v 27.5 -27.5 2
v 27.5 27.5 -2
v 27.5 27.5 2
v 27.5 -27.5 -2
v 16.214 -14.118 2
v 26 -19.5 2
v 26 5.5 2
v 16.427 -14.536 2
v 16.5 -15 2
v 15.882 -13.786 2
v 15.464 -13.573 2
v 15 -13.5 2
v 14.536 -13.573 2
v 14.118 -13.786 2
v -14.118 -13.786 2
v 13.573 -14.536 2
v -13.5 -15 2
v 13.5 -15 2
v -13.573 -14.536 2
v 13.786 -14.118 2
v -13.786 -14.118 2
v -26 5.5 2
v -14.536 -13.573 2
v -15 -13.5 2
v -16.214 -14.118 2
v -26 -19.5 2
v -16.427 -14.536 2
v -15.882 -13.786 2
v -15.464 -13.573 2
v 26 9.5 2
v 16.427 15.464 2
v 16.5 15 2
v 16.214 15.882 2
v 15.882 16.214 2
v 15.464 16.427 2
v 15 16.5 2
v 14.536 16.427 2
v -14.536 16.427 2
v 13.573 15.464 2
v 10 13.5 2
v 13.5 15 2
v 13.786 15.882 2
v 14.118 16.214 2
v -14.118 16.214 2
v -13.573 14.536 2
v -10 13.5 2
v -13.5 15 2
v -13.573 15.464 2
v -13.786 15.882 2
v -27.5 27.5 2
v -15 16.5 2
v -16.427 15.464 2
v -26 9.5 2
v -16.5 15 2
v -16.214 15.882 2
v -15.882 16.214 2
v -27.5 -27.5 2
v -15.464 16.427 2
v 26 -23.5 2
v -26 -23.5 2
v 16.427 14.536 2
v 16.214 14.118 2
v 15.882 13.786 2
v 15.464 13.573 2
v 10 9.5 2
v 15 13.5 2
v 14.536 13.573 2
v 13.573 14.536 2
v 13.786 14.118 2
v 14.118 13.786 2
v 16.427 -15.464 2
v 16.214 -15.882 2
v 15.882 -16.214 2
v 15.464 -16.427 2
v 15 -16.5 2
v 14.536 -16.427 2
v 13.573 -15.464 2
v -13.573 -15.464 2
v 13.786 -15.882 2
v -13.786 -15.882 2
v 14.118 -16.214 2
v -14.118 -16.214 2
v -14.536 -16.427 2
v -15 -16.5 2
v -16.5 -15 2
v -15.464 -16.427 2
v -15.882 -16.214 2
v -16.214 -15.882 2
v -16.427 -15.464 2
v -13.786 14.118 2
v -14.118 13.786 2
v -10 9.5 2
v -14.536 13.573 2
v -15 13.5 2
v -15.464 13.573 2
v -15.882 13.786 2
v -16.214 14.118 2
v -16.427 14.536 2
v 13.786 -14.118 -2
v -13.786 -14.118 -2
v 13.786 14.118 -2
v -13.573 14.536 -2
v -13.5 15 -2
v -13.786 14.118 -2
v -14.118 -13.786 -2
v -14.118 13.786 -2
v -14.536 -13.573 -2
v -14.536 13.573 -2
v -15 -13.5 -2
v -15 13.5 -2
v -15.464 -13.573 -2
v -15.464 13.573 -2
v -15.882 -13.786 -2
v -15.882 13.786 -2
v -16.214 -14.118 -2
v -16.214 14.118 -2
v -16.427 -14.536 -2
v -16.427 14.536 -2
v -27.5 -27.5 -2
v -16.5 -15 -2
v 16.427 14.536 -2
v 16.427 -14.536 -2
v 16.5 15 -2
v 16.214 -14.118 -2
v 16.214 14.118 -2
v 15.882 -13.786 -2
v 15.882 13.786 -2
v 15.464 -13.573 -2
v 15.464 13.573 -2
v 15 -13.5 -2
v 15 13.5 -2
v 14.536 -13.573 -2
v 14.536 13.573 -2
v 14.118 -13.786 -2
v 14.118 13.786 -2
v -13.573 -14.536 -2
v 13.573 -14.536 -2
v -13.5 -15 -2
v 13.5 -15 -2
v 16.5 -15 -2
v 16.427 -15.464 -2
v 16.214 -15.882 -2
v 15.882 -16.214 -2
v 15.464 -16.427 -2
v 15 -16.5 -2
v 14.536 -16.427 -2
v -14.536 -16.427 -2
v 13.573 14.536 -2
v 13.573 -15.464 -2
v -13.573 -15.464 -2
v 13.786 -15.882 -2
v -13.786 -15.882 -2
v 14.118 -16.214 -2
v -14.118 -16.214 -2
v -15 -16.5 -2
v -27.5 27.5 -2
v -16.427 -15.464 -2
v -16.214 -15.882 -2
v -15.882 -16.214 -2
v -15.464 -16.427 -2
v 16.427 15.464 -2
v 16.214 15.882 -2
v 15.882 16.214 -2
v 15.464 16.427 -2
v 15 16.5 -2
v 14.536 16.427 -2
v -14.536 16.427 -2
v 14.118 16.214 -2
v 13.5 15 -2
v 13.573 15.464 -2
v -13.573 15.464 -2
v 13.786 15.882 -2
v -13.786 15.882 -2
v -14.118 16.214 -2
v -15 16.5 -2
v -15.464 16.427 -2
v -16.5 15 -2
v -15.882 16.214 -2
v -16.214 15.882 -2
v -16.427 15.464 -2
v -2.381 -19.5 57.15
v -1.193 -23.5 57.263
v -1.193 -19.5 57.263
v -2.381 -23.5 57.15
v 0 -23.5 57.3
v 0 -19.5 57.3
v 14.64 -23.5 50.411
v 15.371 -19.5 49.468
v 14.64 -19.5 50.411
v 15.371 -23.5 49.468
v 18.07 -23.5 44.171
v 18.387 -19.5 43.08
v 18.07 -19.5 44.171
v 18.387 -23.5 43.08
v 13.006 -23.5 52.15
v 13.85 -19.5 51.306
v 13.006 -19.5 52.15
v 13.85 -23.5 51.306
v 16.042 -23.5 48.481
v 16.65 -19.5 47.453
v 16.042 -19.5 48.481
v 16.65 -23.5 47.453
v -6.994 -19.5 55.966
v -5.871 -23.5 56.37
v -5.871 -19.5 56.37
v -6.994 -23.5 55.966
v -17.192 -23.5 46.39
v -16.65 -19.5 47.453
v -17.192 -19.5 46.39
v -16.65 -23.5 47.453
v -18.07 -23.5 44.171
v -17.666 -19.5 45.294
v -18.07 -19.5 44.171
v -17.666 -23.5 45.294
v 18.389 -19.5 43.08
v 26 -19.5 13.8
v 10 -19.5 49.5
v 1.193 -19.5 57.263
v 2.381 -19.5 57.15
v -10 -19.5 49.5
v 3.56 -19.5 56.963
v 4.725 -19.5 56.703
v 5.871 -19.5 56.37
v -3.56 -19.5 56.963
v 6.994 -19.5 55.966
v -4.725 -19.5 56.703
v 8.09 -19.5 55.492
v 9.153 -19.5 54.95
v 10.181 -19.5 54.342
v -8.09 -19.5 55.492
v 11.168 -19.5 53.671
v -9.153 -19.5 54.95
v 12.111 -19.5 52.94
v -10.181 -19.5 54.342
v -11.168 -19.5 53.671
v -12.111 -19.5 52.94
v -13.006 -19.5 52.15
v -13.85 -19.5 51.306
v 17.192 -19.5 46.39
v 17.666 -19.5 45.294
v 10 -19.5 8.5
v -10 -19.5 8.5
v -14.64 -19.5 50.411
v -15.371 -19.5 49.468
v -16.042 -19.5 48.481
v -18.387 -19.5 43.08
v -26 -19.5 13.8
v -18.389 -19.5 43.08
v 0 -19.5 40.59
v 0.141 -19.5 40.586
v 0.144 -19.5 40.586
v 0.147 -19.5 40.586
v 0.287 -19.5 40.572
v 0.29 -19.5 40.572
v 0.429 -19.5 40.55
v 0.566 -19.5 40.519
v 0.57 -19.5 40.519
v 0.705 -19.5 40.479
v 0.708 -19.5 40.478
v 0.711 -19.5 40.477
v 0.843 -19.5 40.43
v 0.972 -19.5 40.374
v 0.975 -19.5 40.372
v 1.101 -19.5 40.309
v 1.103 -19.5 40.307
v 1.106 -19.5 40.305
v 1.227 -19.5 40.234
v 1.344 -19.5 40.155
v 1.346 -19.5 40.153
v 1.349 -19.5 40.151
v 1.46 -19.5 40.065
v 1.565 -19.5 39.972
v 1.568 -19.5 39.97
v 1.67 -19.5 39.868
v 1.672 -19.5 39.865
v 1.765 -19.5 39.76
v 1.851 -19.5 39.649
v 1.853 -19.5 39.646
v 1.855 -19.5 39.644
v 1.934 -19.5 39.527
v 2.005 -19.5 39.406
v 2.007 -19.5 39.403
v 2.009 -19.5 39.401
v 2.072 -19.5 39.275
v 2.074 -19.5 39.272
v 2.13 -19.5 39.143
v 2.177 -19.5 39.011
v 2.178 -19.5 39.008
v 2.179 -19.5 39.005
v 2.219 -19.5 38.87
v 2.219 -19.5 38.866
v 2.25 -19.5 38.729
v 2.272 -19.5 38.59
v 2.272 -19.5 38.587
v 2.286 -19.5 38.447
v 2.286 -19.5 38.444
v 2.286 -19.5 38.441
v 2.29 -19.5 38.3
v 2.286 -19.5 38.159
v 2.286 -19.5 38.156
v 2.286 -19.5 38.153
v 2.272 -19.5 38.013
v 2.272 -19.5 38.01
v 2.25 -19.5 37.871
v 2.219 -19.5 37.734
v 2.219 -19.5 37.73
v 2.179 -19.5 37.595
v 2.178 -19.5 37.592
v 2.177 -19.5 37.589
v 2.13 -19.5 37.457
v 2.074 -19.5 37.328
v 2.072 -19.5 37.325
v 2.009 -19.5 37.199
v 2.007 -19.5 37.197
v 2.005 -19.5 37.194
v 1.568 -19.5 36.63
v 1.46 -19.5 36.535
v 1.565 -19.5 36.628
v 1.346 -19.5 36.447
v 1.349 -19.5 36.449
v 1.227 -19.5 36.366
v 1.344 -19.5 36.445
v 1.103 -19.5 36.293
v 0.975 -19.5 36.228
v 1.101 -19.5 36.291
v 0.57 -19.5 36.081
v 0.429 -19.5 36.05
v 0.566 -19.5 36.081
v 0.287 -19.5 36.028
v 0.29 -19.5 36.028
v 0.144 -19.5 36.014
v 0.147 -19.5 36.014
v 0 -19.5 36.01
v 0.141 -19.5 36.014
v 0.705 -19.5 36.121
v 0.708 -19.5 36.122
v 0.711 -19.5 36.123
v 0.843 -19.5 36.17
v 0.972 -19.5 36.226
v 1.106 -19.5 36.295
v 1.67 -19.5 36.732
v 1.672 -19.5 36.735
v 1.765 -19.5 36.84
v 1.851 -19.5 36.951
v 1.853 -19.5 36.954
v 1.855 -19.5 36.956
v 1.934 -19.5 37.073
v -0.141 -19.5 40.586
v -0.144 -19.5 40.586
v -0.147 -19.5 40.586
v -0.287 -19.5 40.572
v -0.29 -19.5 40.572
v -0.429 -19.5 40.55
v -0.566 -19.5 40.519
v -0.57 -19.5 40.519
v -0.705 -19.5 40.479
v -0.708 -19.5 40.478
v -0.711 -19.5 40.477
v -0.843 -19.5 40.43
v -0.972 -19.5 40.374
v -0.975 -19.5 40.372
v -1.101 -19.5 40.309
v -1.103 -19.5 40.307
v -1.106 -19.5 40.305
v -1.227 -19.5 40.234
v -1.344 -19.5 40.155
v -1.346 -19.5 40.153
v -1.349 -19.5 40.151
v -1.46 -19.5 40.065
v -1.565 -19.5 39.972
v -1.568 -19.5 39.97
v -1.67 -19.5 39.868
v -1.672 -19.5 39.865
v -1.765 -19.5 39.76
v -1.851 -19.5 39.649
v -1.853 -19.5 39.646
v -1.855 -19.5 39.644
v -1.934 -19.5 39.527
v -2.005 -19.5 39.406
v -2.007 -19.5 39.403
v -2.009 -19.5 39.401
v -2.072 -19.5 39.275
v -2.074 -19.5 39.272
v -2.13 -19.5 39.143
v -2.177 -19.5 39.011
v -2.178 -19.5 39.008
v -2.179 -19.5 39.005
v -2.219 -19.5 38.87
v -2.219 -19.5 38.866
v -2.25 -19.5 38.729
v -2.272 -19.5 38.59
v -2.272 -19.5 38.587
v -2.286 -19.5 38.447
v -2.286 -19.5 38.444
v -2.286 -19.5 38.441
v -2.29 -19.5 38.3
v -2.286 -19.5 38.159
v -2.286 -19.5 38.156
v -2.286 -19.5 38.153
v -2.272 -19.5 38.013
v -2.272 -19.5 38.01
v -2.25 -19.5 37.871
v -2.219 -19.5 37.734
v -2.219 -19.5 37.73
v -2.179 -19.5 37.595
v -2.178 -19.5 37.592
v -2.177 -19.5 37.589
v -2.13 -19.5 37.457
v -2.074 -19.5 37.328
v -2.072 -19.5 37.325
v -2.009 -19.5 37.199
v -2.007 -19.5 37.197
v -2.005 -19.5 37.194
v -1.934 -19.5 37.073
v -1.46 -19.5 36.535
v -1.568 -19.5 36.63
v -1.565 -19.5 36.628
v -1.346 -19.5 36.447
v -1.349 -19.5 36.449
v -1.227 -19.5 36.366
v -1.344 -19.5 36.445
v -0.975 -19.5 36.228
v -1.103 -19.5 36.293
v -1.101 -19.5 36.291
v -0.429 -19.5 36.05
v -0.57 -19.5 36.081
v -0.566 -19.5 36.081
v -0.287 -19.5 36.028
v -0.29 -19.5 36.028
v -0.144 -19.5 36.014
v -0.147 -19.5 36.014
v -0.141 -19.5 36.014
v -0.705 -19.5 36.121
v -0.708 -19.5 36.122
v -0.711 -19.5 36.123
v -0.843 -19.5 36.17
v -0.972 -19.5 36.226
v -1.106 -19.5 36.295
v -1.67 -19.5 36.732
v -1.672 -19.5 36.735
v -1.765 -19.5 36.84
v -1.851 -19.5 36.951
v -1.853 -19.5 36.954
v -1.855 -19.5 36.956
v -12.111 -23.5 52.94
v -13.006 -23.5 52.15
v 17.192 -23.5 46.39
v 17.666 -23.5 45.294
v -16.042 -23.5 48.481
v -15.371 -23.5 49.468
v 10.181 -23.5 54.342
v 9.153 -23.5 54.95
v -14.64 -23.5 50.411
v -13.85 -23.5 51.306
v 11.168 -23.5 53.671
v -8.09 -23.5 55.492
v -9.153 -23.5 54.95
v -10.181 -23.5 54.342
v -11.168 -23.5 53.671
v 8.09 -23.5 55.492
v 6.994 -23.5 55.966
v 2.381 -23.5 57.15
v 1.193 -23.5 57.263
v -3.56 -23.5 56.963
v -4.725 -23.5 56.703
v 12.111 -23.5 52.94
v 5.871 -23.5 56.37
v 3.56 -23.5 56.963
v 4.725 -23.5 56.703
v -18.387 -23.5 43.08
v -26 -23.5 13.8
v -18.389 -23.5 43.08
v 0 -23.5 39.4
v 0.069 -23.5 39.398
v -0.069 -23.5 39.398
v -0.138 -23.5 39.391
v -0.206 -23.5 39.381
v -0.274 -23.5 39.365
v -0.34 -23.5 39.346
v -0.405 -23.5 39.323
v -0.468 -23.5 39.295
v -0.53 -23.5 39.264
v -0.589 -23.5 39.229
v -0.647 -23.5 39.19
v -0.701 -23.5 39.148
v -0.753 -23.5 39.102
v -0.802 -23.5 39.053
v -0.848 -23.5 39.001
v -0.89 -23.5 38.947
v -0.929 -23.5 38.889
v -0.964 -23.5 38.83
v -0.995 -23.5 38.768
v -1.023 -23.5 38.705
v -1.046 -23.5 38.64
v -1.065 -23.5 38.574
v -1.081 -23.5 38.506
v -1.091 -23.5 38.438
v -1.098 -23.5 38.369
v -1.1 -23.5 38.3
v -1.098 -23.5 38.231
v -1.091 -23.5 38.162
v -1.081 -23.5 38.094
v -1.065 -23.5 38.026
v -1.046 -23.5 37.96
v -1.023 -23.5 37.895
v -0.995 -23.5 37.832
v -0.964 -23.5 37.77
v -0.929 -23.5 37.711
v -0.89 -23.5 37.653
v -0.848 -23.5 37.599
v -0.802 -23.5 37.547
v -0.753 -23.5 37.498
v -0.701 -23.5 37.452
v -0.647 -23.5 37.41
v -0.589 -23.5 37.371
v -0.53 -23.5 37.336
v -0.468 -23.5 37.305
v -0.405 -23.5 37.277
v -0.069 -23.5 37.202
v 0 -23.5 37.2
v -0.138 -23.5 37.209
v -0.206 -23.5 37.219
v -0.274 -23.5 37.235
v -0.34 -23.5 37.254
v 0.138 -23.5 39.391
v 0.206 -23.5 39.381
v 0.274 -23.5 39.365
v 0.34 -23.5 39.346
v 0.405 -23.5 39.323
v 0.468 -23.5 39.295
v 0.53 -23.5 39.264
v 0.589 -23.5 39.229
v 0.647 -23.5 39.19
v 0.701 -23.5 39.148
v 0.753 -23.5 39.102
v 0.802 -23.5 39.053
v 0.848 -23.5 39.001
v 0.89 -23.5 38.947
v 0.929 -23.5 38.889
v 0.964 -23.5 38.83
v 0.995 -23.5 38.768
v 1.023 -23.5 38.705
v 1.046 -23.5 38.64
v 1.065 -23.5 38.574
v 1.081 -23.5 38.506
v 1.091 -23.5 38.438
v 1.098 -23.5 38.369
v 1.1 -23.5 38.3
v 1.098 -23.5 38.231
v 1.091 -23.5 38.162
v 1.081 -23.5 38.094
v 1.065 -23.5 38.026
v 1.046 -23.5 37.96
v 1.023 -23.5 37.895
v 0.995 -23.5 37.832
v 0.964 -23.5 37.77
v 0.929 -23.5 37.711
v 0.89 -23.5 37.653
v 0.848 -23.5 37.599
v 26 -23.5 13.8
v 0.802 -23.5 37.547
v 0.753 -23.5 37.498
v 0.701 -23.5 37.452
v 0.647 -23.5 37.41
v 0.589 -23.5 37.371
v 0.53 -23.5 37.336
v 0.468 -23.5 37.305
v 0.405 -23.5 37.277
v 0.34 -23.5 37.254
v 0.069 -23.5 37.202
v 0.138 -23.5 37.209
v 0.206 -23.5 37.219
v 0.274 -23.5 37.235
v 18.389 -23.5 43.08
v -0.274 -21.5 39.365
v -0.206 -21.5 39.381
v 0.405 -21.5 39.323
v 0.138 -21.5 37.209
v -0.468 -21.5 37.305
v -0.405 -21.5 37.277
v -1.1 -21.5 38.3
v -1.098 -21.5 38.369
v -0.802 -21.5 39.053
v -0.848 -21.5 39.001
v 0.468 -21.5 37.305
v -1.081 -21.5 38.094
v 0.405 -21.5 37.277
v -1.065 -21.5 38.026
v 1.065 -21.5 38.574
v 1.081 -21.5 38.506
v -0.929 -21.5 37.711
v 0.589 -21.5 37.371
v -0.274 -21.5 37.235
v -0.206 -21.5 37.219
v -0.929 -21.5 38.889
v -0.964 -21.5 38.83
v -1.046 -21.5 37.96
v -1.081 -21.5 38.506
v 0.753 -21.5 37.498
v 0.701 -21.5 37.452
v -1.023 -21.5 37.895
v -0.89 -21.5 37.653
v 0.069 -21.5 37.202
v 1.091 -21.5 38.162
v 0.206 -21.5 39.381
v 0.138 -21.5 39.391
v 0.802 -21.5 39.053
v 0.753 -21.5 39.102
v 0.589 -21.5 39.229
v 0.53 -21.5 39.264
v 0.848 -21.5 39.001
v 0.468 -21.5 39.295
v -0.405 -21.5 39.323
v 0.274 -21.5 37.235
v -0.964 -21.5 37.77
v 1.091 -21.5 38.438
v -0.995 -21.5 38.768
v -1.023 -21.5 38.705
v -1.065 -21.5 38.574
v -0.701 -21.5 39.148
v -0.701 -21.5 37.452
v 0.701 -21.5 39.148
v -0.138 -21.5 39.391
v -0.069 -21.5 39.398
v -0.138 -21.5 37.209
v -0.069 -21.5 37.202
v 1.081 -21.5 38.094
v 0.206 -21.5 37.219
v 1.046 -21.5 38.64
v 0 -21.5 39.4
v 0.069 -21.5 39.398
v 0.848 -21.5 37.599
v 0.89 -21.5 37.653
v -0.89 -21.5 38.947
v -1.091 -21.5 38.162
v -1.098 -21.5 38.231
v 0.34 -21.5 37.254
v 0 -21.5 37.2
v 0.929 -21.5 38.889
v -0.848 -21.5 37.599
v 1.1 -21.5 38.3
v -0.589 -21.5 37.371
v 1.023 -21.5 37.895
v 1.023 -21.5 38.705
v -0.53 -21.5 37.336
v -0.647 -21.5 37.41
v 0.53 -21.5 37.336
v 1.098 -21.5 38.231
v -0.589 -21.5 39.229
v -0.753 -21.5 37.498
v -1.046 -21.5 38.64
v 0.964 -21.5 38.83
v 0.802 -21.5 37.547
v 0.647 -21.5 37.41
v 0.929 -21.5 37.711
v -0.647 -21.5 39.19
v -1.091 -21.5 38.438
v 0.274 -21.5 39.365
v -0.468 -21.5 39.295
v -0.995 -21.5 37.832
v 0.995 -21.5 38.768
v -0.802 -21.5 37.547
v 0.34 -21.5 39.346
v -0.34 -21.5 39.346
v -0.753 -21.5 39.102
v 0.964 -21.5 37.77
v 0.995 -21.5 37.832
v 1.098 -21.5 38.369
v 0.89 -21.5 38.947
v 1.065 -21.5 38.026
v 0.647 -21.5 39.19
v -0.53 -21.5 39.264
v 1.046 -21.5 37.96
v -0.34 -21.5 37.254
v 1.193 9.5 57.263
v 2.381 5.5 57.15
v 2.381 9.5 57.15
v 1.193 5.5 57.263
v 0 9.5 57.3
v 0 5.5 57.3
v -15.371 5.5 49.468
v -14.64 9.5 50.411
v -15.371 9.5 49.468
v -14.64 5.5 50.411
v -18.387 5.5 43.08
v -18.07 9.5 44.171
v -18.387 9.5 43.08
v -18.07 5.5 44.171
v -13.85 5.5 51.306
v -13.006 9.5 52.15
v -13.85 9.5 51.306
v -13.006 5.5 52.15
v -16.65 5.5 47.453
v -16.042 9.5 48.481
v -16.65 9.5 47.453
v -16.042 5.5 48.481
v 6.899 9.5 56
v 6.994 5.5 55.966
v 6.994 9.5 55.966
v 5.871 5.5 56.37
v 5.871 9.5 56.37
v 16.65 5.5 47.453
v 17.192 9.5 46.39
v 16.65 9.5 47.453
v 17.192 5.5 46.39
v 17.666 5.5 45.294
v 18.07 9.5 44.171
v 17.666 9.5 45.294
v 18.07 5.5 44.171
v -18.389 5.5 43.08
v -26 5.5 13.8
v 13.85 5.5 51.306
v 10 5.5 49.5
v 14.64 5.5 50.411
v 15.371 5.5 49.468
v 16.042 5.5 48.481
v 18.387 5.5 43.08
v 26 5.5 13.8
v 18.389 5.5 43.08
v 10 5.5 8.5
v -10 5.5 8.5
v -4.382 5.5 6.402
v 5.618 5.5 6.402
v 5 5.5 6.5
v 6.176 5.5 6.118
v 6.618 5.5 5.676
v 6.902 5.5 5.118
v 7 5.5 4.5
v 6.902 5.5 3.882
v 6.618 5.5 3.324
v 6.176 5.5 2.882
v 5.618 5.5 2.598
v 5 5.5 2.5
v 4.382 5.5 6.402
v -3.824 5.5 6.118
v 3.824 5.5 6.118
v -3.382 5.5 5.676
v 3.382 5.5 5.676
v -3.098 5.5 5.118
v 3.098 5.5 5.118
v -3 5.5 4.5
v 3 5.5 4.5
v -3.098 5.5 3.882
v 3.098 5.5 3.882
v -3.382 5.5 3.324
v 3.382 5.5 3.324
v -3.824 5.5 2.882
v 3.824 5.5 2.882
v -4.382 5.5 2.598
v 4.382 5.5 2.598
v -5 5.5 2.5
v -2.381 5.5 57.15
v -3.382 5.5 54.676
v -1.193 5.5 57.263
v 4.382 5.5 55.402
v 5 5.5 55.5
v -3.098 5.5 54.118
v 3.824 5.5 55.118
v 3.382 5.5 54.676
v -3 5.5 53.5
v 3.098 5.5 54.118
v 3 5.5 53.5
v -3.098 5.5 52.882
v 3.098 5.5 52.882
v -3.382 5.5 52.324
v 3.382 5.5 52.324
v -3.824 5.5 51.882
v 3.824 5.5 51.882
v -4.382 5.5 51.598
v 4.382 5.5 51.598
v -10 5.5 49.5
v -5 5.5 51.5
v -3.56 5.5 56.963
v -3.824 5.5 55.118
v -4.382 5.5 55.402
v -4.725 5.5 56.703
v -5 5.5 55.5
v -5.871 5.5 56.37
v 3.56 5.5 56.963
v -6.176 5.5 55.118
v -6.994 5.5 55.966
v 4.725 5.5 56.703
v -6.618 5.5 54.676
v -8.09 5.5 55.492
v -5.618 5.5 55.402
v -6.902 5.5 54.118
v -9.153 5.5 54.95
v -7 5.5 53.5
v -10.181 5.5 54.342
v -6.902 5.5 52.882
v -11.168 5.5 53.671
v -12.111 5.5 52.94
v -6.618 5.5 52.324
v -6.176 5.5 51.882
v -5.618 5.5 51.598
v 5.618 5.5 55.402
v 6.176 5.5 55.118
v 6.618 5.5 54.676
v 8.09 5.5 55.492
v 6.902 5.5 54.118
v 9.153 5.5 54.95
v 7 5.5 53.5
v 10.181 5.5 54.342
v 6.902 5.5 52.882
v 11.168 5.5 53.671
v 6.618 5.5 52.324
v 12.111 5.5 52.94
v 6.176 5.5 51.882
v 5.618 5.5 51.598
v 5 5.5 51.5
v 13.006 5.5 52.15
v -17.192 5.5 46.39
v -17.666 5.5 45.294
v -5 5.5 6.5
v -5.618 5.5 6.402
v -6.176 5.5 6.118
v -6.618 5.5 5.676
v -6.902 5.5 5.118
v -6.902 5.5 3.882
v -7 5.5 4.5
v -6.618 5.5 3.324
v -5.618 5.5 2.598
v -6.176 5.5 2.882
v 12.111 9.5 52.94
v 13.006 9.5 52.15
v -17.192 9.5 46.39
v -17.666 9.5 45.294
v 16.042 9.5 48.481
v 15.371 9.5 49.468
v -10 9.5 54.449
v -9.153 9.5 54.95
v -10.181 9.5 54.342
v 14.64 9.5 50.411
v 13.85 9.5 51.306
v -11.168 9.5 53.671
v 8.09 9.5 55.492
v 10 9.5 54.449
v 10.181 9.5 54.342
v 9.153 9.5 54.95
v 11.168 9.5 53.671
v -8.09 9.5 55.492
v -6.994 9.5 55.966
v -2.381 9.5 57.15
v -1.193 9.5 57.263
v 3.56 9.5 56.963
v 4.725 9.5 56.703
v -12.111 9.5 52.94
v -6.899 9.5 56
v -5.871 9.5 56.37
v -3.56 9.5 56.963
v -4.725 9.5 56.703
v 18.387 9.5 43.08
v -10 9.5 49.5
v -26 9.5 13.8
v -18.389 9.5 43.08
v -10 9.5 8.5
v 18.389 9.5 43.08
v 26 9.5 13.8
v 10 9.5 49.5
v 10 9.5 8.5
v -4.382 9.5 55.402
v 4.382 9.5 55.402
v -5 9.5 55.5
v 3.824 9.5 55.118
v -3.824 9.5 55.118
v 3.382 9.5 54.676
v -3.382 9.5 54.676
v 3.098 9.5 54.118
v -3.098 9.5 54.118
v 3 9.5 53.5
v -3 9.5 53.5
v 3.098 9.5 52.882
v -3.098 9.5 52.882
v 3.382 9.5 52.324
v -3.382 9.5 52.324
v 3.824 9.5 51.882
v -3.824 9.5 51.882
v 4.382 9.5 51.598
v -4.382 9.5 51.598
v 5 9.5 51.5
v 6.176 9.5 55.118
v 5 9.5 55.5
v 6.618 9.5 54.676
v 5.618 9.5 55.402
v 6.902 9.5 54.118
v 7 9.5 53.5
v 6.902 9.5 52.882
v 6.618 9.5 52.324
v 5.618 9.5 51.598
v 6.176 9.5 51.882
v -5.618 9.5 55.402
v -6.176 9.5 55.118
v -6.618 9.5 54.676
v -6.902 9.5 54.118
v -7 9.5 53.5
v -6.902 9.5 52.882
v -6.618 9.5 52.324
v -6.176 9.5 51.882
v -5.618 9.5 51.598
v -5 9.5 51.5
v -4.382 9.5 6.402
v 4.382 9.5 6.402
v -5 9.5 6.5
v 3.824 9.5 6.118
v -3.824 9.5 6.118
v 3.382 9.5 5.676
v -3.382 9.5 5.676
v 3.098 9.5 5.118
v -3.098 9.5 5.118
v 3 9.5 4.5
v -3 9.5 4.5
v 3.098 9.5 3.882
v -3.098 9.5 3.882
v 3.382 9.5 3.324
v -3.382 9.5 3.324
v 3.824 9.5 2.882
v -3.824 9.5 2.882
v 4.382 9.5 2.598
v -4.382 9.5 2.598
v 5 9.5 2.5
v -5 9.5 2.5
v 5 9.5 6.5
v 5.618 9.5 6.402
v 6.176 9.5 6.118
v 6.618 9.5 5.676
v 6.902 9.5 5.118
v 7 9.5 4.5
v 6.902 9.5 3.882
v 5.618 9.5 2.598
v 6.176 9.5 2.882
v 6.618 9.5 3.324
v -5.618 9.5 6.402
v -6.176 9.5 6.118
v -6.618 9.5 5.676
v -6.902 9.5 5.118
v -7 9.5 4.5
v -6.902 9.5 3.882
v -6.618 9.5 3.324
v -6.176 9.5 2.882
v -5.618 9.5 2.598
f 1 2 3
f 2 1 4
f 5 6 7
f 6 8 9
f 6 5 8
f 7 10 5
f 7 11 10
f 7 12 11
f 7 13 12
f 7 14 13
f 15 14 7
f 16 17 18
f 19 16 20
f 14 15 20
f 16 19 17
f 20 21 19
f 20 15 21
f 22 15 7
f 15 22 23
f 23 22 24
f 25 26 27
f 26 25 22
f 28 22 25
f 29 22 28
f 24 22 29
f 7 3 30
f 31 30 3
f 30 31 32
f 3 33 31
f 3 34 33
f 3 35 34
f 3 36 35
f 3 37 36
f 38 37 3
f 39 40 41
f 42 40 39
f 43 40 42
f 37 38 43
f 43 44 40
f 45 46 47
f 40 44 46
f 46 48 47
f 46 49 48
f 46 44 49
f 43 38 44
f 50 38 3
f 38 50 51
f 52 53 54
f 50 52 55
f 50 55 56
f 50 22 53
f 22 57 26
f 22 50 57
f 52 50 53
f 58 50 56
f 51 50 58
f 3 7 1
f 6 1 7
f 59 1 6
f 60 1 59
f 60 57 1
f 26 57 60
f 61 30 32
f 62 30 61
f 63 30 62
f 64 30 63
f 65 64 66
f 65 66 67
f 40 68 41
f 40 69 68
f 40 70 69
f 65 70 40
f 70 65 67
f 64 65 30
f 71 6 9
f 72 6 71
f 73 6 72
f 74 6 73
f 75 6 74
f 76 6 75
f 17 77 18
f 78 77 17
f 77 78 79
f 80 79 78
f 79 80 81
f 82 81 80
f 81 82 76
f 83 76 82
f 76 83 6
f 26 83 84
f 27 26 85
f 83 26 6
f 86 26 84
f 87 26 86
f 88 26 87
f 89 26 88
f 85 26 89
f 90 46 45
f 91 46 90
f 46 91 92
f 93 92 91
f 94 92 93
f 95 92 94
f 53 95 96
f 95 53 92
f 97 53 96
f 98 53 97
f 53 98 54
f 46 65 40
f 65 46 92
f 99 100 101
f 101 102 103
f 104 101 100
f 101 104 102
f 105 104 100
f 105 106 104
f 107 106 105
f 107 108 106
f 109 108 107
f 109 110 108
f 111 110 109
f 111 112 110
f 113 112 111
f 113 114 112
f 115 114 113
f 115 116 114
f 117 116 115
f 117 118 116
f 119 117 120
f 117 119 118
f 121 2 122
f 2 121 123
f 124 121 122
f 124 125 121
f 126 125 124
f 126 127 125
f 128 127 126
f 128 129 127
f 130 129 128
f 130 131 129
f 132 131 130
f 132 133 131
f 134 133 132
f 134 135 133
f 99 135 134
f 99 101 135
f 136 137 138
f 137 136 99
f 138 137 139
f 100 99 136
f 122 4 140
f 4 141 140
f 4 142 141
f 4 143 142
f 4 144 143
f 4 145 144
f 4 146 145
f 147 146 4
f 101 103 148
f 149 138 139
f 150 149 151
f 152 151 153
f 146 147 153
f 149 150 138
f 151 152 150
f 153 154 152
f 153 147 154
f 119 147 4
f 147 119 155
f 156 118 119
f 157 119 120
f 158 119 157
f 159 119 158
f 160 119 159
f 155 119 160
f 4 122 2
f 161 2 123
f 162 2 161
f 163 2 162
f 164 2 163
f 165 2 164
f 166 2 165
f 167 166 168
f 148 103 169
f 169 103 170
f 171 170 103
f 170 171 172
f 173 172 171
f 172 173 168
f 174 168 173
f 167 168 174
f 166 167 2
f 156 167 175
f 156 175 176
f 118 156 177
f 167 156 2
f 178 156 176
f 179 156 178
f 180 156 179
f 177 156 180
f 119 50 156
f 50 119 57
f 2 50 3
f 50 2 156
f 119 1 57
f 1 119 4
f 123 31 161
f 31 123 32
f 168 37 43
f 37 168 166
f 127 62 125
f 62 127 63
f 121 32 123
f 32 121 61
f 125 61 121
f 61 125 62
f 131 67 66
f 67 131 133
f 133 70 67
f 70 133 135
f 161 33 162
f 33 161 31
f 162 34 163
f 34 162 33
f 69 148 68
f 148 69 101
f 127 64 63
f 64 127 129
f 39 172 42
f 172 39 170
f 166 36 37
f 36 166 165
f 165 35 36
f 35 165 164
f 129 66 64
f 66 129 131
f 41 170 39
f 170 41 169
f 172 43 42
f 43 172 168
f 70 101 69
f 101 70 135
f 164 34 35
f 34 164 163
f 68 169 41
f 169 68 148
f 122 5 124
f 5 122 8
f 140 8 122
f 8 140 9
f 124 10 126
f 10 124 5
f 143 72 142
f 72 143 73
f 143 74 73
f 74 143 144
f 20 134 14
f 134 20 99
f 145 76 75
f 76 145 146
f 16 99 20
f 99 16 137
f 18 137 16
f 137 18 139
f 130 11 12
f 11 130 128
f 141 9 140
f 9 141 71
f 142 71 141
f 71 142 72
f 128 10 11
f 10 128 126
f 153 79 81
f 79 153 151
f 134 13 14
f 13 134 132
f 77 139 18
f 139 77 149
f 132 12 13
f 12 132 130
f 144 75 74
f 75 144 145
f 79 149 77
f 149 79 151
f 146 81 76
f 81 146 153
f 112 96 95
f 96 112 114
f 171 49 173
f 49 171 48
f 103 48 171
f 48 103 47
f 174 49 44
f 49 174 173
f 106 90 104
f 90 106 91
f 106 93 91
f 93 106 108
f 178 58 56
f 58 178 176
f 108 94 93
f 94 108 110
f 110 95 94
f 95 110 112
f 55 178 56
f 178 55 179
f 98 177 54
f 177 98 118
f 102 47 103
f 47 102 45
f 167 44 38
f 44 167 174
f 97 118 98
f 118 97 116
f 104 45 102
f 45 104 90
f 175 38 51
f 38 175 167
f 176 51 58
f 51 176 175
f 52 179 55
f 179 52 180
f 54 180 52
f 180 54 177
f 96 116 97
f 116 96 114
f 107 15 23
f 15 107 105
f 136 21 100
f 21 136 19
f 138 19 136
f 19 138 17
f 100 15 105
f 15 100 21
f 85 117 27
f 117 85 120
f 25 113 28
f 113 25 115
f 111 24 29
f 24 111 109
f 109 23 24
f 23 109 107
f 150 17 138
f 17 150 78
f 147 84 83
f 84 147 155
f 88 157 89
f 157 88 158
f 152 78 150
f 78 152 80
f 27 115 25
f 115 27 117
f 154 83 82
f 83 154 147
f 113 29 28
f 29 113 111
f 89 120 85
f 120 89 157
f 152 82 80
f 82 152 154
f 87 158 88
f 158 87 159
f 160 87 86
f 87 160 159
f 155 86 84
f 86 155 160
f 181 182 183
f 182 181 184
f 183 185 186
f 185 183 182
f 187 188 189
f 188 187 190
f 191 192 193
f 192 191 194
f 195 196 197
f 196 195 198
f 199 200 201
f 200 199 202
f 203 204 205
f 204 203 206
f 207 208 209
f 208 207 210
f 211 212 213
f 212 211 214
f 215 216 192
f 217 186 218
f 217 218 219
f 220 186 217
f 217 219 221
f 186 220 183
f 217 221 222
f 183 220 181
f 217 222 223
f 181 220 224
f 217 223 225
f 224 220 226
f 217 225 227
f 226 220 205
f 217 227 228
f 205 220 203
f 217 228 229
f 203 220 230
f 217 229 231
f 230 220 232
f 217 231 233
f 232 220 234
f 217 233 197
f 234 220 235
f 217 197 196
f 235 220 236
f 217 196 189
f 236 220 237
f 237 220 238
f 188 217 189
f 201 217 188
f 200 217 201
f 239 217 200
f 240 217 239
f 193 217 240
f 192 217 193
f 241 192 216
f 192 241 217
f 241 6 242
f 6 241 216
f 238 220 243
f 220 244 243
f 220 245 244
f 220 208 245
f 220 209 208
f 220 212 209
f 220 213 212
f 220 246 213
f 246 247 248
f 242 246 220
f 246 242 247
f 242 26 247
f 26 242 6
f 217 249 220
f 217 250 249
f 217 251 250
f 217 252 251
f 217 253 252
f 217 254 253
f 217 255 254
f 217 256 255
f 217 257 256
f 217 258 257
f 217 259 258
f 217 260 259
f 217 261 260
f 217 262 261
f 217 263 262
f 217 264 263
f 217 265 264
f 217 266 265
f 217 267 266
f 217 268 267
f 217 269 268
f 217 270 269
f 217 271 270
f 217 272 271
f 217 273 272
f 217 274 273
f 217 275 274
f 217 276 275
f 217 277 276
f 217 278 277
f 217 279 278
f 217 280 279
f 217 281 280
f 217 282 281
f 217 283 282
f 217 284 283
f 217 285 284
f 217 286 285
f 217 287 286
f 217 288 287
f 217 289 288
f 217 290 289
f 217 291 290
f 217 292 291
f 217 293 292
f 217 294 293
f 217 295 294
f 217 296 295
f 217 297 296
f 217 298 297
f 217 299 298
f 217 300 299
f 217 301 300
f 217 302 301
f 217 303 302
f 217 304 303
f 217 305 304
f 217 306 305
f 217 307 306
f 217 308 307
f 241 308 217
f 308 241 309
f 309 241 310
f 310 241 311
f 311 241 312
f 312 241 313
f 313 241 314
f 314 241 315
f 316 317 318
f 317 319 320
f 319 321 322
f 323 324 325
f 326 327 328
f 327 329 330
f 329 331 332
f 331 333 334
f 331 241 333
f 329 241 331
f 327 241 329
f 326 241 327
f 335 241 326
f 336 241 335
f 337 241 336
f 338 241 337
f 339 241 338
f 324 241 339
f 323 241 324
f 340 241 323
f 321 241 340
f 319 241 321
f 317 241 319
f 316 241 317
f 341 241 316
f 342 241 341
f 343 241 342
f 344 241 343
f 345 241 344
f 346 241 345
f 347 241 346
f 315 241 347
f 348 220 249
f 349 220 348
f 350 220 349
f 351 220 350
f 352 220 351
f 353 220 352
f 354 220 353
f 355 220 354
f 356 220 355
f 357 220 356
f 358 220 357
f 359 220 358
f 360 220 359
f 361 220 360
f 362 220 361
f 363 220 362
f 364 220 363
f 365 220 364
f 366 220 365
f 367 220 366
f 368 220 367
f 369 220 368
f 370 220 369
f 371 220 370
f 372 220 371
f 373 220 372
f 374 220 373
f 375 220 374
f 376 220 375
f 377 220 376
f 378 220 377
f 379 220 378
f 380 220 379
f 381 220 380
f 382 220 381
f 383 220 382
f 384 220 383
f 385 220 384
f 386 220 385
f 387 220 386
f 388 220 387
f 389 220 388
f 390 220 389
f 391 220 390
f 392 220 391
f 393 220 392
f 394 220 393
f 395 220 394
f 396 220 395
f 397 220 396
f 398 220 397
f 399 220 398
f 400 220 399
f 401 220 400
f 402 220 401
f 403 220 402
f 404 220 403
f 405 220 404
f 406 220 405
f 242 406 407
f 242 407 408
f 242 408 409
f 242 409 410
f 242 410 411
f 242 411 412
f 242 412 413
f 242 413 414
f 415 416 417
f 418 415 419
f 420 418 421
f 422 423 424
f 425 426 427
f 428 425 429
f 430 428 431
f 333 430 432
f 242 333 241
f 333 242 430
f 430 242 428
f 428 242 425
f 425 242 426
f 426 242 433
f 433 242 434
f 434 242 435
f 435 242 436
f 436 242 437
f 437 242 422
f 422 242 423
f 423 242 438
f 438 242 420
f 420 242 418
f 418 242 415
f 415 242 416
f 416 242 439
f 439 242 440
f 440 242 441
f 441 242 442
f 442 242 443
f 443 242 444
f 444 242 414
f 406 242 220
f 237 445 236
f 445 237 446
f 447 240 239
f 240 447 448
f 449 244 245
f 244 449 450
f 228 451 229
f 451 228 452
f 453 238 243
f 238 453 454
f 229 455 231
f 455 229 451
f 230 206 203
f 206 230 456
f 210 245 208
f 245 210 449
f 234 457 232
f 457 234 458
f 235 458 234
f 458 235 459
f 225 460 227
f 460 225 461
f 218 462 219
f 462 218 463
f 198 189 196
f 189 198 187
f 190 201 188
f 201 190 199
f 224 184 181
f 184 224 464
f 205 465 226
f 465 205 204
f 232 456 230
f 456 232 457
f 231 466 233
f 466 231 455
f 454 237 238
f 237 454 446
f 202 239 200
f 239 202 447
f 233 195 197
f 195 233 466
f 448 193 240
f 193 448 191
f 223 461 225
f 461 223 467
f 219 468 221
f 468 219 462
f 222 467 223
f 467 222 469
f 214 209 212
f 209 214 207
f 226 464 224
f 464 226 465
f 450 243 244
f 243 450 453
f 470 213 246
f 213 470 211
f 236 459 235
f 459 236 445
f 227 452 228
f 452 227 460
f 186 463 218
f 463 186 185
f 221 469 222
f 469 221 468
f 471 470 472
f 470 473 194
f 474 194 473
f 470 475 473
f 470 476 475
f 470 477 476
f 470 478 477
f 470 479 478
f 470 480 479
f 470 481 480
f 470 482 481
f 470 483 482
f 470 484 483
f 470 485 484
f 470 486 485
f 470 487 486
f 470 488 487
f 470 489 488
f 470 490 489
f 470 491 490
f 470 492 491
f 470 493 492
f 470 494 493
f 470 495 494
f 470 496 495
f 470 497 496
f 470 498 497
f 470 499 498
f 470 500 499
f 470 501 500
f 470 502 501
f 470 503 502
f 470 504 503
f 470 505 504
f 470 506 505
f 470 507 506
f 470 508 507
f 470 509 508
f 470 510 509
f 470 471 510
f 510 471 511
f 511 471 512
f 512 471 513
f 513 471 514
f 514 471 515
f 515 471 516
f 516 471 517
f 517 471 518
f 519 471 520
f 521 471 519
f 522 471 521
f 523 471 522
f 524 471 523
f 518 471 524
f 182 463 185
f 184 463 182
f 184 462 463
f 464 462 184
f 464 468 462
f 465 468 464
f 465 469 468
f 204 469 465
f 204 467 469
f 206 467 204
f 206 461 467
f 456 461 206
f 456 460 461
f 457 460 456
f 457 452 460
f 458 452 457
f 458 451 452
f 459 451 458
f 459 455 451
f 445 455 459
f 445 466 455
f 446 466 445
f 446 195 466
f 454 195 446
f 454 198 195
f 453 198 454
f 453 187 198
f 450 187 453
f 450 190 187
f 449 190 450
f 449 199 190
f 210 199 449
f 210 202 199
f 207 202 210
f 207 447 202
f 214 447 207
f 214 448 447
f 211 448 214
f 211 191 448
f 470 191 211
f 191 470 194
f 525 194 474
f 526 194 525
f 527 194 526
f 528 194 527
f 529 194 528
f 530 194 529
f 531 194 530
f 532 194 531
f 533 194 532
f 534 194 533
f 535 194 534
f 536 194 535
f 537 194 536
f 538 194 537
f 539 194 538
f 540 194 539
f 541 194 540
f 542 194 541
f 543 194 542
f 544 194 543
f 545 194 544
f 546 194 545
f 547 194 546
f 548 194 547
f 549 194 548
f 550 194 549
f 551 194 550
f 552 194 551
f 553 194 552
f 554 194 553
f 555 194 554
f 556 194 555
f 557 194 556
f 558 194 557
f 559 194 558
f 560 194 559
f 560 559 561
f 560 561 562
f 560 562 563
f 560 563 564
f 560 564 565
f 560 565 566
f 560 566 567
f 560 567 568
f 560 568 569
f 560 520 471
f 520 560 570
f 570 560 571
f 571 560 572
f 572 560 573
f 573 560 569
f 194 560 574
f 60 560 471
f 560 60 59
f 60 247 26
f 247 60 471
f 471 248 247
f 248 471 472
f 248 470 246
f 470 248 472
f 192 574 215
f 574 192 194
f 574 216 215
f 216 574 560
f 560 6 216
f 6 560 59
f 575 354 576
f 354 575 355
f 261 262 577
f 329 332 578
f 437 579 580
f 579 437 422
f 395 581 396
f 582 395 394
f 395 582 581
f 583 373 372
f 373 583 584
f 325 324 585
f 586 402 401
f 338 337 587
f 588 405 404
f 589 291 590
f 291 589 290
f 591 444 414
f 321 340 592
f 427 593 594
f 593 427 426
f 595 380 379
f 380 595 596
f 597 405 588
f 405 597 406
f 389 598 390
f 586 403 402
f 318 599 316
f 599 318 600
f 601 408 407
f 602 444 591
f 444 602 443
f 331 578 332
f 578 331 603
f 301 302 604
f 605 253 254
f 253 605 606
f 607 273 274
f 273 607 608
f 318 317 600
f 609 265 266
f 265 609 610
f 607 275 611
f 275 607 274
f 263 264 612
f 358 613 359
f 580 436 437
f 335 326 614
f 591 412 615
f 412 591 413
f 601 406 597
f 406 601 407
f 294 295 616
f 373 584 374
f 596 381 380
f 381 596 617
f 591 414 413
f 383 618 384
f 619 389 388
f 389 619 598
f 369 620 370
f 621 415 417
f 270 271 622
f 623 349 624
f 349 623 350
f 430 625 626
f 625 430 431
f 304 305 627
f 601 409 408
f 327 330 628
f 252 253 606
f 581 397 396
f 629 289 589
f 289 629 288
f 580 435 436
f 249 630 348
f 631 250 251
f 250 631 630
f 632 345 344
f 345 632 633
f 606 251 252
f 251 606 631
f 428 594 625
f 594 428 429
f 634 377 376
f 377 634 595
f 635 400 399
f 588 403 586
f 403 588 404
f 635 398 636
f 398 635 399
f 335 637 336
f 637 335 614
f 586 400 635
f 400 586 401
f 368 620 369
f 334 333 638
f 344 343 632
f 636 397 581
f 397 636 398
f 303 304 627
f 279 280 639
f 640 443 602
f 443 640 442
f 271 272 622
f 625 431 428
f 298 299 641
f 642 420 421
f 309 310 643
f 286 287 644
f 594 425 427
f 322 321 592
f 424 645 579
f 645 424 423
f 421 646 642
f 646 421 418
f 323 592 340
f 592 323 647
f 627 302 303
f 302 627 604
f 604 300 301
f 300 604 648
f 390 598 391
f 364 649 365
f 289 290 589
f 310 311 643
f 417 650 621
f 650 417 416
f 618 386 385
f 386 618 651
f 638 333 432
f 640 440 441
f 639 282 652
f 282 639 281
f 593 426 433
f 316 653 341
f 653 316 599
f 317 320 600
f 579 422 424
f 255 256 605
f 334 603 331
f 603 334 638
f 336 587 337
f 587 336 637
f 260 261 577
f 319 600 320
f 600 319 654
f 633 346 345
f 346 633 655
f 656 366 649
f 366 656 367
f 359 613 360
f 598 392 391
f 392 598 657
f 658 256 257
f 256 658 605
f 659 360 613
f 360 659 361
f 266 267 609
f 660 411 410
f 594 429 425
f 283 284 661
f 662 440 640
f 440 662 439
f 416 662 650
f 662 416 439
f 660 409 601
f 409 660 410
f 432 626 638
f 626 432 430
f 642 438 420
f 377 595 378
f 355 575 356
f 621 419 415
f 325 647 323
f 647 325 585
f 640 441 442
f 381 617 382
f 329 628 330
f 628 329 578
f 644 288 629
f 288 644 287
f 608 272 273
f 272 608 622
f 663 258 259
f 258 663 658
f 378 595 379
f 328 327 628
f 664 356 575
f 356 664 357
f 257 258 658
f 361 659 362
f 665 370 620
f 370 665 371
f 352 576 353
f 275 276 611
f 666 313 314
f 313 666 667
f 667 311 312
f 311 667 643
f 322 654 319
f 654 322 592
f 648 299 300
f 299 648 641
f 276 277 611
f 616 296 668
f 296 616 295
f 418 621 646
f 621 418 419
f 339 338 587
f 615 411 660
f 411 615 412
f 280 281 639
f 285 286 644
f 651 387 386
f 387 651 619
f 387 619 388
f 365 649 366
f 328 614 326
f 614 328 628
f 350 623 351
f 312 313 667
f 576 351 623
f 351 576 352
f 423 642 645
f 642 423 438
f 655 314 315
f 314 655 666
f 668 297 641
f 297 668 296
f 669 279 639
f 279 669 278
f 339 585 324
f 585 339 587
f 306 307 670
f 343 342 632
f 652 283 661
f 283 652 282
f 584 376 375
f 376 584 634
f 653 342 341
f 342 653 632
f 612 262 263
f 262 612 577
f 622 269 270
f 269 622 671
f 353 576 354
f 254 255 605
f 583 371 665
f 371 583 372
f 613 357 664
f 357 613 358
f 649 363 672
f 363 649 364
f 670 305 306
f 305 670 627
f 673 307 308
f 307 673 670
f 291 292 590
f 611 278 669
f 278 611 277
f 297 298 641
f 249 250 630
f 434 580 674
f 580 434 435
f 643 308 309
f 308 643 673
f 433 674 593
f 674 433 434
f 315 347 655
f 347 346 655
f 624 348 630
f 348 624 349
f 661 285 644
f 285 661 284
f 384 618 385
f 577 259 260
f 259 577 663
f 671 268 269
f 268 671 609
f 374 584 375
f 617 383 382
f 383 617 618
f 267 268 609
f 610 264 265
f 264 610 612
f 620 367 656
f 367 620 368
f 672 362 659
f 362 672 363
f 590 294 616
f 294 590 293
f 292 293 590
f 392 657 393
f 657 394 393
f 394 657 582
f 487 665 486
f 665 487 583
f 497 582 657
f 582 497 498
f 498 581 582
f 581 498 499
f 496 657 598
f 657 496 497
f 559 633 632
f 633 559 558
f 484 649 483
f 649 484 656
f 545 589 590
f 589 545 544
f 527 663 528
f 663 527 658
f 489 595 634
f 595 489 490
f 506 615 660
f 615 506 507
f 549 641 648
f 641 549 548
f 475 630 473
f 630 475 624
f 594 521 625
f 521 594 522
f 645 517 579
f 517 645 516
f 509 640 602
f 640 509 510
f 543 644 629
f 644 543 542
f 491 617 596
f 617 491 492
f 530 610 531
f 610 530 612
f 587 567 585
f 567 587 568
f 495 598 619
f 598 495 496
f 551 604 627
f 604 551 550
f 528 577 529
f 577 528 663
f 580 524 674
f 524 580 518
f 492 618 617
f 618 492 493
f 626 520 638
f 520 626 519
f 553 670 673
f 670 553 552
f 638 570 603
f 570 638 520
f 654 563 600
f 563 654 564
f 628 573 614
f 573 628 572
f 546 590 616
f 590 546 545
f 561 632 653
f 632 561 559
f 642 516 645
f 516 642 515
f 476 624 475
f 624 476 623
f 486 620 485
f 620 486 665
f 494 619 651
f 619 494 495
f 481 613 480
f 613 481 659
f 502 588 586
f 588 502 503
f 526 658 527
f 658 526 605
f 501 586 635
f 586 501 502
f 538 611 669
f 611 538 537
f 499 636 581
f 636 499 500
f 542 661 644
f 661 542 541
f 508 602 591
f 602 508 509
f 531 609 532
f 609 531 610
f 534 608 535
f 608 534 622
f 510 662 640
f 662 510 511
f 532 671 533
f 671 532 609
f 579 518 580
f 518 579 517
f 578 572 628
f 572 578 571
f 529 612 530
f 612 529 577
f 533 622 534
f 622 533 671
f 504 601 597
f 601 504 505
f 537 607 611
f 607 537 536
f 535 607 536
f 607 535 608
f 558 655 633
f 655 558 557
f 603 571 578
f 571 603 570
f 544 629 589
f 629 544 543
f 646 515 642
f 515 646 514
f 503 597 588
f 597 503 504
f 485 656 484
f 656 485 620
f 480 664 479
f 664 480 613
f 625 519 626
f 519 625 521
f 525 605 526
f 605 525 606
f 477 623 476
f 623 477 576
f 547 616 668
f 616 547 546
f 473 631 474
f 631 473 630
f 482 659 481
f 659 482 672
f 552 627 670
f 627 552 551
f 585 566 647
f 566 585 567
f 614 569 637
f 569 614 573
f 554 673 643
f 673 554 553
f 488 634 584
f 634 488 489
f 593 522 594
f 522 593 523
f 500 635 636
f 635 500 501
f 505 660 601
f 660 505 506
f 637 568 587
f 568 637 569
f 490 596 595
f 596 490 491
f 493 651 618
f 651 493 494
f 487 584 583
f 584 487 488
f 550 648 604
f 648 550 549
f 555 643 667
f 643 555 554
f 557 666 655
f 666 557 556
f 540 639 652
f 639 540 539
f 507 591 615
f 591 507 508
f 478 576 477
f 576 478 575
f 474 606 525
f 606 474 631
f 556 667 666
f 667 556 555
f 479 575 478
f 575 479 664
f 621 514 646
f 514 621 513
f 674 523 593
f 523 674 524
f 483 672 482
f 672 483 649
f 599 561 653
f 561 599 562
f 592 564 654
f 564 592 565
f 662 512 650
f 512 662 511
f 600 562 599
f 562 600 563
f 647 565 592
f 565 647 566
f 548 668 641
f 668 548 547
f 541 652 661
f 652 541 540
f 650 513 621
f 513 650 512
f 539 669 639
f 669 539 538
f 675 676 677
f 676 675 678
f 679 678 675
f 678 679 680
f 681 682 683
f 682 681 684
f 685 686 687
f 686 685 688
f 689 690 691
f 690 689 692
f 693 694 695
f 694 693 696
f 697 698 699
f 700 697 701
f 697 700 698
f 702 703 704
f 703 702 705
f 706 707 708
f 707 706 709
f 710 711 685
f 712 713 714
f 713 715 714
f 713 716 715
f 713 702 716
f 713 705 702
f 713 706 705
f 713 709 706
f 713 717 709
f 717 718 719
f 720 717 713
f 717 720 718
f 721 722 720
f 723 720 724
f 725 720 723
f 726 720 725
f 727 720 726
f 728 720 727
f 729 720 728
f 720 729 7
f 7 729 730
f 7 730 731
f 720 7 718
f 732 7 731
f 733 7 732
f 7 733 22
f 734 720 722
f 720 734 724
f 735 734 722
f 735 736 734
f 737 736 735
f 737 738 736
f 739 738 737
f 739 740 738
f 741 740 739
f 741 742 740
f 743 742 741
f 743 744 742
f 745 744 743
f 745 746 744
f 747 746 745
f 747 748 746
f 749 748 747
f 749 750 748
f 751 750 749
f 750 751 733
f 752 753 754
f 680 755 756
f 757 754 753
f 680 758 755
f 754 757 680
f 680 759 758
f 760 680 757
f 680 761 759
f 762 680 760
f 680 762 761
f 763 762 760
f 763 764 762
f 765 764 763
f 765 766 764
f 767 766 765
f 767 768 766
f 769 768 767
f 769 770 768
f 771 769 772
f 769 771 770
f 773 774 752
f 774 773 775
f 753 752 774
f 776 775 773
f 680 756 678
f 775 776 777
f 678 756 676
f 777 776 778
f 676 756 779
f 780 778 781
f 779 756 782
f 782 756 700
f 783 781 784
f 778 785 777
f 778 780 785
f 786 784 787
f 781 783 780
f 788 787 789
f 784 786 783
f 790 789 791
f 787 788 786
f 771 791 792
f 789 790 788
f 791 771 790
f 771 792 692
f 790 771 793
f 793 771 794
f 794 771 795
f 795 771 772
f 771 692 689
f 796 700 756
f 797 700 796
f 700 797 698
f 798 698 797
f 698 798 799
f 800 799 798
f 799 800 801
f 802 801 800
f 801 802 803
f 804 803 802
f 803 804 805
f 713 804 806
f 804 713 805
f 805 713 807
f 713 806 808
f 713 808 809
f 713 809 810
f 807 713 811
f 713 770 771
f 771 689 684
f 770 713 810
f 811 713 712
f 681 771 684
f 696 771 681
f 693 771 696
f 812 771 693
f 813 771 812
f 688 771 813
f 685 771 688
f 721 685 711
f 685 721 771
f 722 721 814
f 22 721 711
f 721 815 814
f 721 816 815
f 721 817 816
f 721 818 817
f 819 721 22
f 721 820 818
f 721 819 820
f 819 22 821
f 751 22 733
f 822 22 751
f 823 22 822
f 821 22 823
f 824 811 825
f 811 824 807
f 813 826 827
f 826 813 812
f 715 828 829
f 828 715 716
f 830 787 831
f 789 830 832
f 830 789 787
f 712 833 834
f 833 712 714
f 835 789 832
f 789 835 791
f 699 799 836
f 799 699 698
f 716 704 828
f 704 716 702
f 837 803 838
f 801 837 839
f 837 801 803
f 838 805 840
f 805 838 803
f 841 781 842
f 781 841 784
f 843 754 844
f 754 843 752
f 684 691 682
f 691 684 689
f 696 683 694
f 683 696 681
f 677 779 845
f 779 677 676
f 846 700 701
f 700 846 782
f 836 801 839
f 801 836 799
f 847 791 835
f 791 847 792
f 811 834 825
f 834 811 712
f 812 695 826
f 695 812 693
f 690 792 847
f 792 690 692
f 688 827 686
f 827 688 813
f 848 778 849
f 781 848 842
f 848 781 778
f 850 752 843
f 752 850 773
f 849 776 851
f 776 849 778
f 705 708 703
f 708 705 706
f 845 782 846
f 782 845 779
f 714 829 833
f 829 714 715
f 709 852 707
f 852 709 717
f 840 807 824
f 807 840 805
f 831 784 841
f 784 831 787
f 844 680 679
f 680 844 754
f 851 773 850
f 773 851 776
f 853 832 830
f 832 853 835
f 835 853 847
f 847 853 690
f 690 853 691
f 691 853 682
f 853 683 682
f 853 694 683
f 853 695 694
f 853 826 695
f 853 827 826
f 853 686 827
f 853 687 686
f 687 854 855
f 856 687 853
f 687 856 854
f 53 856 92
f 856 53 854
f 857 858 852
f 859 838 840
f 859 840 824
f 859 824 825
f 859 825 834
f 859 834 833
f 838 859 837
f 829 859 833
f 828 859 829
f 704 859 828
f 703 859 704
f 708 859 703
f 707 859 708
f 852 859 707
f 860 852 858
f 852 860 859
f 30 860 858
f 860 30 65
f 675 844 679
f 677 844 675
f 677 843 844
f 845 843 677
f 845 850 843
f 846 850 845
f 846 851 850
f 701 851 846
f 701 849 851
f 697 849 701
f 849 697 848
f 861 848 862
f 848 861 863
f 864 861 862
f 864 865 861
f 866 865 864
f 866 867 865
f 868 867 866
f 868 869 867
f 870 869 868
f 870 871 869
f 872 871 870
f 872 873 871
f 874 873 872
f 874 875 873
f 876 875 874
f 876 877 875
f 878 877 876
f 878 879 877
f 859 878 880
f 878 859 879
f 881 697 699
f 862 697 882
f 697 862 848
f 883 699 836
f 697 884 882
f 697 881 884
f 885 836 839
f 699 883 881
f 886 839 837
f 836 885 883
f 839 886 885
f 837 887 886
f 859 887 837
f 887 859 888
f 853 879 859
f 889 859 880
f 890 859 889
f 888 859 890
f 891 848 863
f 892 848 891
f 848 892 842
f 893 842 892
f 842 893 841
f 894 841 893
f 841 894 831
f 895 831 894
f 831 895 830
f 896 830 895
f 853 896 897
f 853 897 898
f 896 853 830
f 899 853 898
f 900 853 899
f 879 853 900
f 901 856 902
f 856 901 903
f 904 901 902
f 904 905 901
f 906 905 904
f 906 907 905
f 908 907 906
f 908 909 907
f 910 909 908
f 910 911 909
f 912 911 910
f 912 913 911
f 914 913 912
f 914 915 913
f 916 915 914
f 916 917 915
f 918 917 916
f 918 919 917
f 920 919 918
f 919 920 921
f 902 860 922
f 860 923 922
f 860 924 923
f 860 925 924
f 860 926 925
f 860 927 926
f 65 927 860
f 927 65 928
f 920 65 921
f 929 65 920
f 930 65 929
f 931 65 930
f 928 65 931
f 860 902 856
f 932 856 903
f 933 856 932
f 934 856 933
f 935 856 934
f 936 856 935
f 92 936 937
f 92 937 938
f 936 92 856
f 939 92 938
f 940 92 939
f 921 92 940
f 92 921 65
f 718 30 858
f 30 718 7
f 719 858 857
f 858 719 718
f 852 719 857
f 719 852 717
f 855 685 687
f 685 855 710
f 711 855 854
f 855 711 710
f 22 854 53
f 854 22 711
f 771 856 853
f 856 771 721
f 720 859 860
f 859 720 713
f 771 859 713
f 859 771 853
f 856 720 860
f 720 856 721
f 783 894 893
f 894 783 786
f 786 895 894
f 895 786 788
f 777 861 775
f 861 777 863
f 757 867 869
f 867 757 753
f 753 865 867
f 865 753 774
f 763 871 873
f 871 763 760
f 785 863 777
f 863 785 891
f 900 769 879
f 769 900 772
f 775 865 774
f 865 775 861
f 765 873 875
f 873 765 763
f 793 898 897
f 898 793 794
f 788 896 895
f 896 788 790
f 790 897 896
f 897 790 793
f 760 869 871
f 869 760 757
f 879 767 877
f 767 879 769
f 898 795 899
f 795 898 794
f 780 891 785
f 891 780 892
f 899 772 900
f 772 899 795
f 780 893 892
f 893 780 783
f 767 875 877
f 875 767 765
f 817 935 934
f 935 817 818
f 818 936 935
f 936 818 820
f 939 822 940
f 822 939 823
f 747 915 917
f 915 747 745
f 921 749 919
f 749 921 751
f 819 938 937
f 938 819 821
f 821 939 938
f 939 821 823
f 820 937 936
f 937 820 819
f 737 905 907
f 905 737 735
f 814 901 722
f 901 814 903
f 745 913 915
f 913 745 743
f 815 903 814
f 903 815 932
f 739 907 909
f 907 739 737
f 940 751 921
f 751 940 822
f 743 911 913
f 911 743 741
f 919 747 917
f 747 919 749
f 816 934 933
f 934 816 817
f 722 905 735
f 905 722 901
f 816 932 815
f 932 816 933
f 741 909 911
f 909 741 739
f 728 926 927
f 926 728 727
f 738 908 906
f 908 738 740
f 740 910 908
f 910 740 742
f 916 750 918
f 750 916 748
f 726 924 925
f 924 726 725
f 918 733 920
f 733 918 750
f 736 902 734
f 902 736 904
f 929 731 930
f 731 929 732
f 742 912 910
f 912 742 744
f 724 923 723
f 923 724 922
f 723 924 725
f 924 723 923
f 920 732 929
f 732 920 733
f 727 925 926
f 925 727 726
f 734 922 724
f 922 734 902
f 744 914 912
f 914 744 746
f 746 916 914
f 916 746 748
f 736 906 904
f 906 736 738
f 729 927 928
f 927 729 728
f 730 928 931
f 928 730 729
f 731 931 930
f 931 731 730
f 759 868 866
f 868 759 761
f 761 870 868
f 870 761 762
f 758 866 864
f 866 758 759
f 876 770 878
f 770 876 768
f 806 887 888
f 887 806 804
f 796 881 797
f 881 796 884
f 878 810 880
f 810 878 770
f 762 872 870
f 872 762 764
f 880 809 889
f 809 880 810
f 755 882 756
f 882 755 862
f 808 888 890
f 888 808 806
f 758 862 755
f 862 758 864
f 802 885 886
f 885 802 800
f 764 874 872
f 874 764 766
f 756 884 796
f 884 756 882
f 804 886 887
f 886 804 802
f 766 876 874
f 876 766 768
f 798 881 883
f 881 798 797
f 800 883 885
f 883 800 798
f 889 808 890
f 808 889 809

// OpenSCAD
//-------------------------------------------------------------------------
//-- REPY-2.0_lower.scad
//-------------------------------------------------------------------------
//--This file has been generated automatically according to your data.
//--For more info, visit: http://iearobotics.com/oomlwiki/
//--------------------------------------------------------------------------

difference() {
  union() {
    difference() {
      cube(size=[55.000, 55.000, 4.000], center=true);
      translate(v=[15.000, 15.000, 0.000]) {
        cylinder(h=4.100, r1=1.500, r2=1.500, $fn=20, center=true);
      } // End translate
      translate(v=[15.000, -15.000, 0.000]) {
        cylinder(h=4.100, r1=1.500, r2=1.500, $fn=20, center=true);
      } // End translate
      translate(v=[-15.000, 15.000, 0.000]) {
        cylinder(h=4.100, r1=1.500, r2=1.500, $fn=20, center=true);
      } // End translate
      translate(v=[-15.000, -15.000, 0.000]) {
        cylinder(h=4.100, r1=1.500, r2=1.500, $fn=20, center=true);
      } // End translate
    } // End difference
    translate(v=[0.000, -23.500, 1.800]) {
      rotate(a=[0.000, 0.000, 180.000]) {
        rotate(a=[90.000, 0.000, 0.000]) {
          difference() {
            union() {
              linear_extrude(height=4.000, twist=0, $fn=100, convexity=10, center=false) {
                translate(v=[0.000, 36.500, 0.000]) {
                  circle(r=19.000, $fn=100);
                } // End translate
              } // End linear_extrude
              polyhedron(points=[[0.000, 0.000, 0.000], [0.000, 0.000, 4.000], [26.000, 0.000, 0.000], [26.000, 0.000, 4.000], [26.000, 12.000, 0.000], [26.000, 12.000, 4.000], [18.389, 41.280, 0.000], [18.389, 41.280, 4.000], [-18.389, 41.280, 0.000], [-18.389, 41.280, 4.000], [-26.000, 12.000, 0.000], [-26.000, 12.000, 4.000], [-26.000, 0.000, 0.000], [-26.000, 0.000, 4.000]], triangles=[[1, 3, 5], [12, 10, 0], [1, 5, 7], [10, 8, 0], [1, 7, 9], [8, 6, 0], [1, 9, 11], [6, 4, 0], [1, 11, 13], [4, 2, 0], [0, 3, 1], [0, 2, 3], [2, 5, 3], [2, 4, 5], [4, 7, 5], [4, 6, 7], [6, 9, 7], [6, 8, 9], [8, 11, 9], [8, 10, 11], [10, 13, 11], [10, 12, 13], [12, 1, 13], [12, 0, 1]]);
            } // End union
            color([0.500, 0.200, 1.000, 1.000]) {
              translate(v=[0.000, 36.500, 0.000]) {
                union() {
                  translate(v=[0.000, 0.000, 2.000]) {
                    cylinder(h=2.100, r1=1.100, r2=2.350, $fn=100, center=false);
                  } // End translate
                  translate(v=[0.000, 0.000, -0.100]) {
                    cylinder(h=2.100, r1=1.100, r2=1.100, $fn=100, center=false);
                  } // End translate
                } // End union
              } // End translate
            } // End color
          } // End difference
        } // End rotate
      } // End rotate
    } // End translate
    translate(v=[0.000, 9.500, 1.800]) {
      rotate(a=[90.000, 0.000, 0.000]) {
        union() {
          linear_extrude(height=4.000, twist=0, $fn=100, convexity=10, center=false) {
            translate(v=[0.000, 36.500, 0.000]) {
              circle(r=19.000, $fn=100);
            } // End translate
          } // End linear_extrude
          polyhedron(points=[[0.000, 0.000, 0.000], [0.000, 0.000, 4.000], [26.000, 0.000, 0.000], [26.000, 0.000, 4.000], [26.000, 12.000, 0.000], [26.000, 12.000, 4.000], [18.389, 41.280, 0.000], [18.389, 41.280, 4.000], [-18.389, 41.280, 0.000], [-18.389, 41.280, 4.000], [-26.000, 12.000, 0.000], [-26.000, 12.000, 4.000], [-26.000, 0.000, 0.000], [-26.000, 0.000, 4.000]], triangles=[[1, 3, 5], [12, 10, 0], [1, 5, 7], [10, 8, 0], [1, 7, 9], [8, 6, 0], [1, 9, 11], [6, 4, 0], [1, 11, 13], [4, 2, 0], [0, 3, 1], [0, 2, 3], [2, 5, 3], [2, 4, 5], [4, 7, 5], [4, 6, 7], [6, 9, 7], [6, 8, 9], [8, 11, 9], [8, 10, 11], [10, 13, 11], [10, 12, 13], [12, 1, 13], [12, 0, 1]]);
        } // End union
      } // End rotate
    } // End translate
  } // End union
  translate(v=[0.000, -19.500, 8.500]) {
    rotate(a=[90.000, 0.000, 180.000]) {
      color([0.250, 0.250, 0.250, 1.000]) {
        union() {
          translate(v=[-10.000, 0.000, 0.000]) {
            cube(size=[20.000, 41.000, 38.000], center=false);
          } // End translate
          translate(v=[0.000, 30.000, 41.000]) {
            cylinder(h=6.000, r1=3.000, r2=3.000, $fn=20, center=true);
          } // End translate
          translate(v=[-10.000, 41.000, 29.000]) {
            cube(size=[20.000, 6.500, 4.000], center=false);
          } // End translate
          translate(v=[-10.000, -6.500, 29.000]) {
            cube(size=[20.000, 6.500, 4.000], center=false);
          } // End translate
          translate(v=[5.000, 45.000, 31.000]) {
            cylinder(h=12.100, r1=2.000, r2=2.000, $fn=20, center=true);
          } // End translate
          translate(v=[5.000, -4.000, 31.000]) {
            cylinder(h=12.100, r1=2.000, r2=2.000, $fn=20, center=true);
          } // End translate
          translate(v=[-5.000, -4.000, 31.000]) {
            cylinder(h=12.100, r1=2.000, r2=2.000, $fn=20, center=true);
          } // End translate
          translate(v=[-5.000, 45.000, 31.000]) {
            cylinder(h=12.100, r1=2.000, r2=2.000, $fn=20, center=true);
          } // End translate
        } // End union
      } // End color
    } // End rotate
  } // End translate
} // End difference
